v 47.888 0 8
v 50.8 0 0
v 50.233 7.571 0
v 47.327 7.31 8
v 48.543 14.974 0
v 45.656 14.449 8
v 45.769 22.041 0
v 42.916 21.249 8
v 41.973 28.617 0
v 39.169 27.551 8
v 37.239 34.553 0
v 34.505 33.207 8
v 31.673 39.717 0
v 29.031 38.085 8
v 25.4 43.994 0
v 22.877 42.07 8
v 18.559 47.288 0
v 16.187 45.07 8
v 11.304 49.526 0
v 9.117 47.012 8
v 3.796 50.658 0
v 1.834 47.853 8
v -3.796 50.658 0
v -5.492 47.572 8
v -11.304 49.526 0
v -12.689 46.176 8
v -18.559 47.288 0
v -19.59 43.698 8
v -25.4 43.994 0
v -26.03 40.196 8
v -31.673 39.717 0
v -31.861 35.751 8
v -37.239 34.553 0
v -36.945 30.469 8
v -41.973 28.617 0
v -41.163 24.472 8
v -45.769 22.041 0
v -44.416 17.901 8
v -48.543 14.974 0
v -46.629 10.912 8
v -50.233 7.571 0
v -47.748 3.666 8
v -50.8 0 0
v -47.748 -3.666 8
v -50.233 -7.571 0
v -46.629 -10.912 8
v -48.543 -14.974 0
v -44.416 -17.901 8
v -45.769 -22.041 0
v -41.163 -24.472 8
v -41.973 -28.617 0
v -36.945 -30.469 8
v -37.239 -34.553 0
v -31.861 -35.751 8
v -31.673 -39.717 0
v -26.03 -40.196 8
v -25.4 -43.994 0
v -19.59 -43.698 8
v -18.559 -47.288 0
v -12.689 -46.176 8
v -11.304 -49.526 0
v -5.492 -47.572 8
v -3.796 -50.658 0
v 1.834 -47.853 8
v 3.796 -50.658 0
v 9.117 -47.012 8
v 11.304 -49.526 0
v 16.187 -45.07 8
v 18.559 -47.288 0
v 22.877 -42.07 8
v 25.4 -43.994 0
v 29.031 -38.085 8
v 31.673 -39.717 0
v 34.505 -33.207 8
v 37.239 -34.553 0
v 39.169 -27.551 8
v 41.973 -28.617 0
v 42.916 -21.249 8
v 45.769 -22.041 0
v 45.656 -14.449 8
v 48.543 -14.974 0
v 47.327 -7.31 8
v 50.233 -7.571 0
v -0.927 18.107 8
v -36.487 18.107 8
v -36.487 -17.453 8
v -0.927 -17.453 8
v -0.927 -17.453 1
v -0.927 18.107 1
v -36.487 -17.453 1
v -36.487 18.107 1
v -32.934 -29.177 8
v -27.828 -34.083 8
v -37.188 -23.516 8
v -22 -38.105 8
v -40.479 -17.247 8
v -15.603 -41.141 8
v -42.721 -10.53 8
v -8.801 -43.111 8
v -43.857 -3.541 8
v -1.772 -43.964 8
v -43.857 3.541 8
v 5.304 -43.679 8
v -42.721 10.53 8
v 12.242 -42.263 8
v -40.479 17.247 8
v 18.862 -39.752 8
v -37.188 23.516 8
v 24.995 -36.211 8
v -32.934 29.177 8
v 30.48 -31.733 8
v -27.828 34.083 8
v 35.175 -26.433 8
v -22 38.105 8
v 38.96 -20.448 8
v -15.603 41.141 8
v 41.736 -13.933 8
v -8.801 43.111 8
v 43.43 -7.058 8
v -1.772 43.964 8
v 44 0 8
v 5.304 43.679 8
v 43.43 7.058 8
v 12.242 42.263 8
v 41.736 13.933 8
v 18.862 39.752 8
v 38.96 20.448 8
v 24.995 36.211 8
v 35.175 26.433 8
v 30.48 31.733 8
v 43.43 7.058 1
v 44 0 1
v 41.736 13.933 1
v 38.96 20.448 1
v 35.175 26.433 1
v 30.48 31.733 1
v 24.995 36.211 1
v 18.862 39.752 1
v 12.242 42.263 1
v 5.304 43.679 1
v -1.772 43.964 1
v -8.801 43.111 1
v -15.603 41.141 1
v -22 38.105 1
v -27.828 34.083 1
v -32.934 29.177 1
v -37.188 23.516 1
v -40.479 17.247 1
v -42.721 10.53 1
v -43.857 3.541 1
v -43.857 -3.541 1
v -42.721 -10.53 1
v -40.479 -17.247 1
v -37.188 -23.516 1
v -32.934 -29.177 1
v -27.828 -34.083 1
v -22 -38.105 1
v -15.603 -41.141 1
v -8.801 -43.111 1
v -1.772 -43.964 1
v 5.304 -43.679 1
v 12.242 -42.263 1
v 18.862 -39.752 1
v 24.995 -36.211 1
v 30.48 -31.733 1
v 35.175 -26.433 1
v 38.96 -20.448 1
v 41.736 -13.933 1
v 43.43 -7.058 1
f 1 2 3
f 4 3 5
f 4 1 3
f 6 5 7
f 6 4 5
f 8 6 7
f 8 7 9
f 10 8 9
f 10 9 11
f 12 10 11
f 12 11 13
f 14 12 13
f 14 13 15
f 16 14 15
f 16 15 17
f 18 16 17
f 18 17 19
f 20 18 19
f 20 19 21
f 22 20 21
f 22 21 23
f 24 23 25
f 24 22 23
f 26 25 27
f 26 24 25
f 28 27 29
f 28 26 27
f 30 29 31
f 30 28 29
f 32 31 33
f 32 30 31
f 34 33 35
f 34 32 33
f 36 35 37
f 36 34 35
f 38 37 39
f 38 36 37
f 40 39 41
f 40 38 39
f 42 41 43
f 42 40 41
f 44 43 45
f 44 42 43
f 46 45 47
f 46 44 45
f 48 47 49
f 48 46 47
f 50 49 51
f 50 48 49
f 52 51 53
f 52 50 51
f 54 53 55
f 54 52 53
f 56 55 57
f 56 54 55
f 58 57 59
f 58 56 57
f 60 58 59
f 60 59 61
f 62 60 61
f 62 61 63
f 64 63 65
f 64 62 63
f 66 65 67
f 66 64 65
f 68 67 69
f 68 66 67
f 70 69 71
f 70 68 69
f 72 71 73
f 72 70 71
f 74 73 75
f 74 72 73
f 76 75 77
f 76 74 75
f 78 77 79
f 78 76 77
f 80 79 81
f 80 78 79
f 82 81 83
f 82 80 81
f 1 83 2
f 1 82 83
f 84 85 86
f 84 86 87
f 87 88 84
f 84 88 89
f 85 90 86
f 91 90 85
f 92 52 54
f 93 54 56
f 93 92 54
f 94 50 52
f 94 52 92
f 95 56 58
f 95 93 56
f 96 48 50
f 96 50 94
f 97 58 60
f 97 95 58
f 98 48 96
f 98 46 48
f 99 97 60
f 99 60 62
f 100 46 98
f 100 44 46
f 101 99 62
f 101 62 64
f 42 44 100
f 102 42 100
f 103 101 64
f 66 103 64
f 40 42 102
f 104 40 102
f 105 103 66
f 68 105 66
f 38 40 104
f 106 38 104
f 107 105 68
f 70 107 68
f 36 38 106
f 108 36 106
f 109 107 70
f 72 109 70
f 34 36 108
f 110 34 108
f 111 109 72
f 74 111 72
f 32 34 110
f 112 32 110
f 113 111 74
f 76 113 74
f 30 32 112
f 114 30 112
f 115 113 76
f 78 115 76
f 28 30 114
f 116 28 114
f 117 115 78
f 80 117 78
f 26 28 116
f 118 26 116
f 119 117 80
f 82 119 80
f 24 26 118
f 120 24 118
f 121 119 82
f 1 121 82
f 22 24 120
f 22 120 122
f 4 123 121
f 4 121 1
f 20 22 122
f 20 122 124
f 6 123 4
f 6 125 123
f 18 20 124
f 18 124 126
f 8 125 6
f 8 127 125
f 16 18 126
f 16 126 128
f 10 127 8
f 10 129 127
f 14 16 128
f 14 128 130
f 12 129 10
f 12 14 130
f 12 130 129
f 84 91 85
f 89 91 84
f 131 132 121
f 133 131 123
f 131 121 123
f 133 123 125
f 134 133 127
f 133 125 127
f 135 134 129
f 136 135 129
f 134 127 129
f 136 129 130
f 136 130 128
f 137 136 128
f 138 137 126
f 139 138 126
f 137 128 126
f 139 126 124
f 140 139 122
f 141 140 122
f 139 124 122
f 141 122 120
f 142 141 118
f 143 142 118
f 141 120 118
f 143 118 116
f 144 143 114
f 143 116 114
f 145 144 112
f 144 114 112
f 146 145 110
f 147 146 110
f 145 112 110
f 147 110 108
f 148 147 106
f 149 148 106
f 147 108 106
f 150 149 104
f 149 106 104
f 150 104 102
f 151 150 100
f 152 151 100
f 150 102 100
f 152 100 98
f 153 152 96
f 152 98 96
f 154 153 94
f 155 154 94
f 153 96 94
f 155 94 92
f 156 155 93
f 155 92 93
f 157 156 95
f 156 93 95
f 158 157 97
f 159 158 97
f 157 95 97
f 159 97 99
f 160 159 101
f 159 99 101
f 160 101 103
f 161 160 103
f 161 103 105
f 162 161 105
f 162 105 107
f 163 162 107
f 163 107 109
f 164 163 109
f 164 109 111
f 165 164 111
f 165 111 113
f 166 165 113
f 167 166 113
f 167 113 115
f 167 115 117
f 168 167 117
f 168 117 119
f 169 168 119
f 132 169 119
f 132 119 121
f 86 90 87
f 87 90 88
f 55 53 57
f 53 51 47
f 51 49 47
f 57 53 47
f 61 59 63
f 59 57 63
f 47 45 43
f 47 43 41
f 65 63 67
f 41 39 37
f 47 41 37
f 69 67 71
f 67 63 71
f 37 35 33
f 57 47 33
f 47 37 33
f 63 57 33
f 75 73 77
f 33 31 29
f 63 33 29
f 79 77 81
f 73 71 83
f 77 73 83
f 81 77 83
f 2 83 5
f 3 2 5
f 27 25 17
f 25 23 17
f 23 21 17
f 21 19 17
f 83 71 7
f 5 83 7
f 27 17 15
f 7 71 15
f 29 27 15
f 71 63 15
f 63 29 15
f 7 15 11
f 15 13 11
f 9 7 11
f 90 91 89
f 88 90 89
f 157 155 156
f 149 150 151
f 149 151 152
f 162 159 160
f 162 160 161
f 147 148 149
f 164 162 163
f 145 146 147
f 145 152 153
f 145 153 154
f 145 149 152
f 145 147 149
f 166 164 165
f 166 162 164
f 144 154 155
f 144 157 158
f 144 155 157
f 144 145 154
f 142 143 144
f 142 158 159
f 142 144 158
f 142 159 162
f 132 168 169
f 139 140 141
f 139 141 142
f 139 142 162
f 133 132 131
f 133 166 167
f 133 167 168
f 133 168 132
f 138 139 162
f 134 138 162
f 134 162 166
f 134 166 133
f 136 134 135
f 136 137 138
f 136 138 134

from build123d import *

# Parameters (mm, degrees)
F0_R     = 50.8
F1_DEPTH = 8
F1_TAPER = 20
F2_R     = 44
F3_DEPTH = 7
F4_W     = 35.56
F4_H     = 35.56
F5_DEPTH = 7
F7_R     = 2.158544492
F8_DEPTH = 25.4


with BuildPart() as f1:
    # F0 (on Top) → F1 (new body)
    with BuildSketch(Plane.XY):
        Circle(F0_R)
    extrude(amount=F1_DEPTH, taper=F1_TAPER)

    # F2 (on face) → F3 (cut)
    with BuildSketch(Plane.XY.offset(8)):
        Circle(F2_R)
    extrude(amount=-F3_DEPTH, mode=Mode.SUBTRACT)

    # F7 (on offset) → F8 (cut)
    with BuildSketch(Plane.YZ.offset(40)):
        with Locations((0, 5.6122122332)):
            Circle(F7_R)
    extrude(amount=-F8_DEPTH, mode=Mode.SUBTRACT)


with BuildPart() as f5:
    # F4 (on face) → F5 (new body)
    with BuildSketch(Plane.XY.offset(1)):
        with Locations((-18.7073708512, 0.3267968753)):
            Rectangle(F4_W, F4_H)
    extrude(amount=F5_DEPTH)


solid = Compound([f1.part, f5.part])
